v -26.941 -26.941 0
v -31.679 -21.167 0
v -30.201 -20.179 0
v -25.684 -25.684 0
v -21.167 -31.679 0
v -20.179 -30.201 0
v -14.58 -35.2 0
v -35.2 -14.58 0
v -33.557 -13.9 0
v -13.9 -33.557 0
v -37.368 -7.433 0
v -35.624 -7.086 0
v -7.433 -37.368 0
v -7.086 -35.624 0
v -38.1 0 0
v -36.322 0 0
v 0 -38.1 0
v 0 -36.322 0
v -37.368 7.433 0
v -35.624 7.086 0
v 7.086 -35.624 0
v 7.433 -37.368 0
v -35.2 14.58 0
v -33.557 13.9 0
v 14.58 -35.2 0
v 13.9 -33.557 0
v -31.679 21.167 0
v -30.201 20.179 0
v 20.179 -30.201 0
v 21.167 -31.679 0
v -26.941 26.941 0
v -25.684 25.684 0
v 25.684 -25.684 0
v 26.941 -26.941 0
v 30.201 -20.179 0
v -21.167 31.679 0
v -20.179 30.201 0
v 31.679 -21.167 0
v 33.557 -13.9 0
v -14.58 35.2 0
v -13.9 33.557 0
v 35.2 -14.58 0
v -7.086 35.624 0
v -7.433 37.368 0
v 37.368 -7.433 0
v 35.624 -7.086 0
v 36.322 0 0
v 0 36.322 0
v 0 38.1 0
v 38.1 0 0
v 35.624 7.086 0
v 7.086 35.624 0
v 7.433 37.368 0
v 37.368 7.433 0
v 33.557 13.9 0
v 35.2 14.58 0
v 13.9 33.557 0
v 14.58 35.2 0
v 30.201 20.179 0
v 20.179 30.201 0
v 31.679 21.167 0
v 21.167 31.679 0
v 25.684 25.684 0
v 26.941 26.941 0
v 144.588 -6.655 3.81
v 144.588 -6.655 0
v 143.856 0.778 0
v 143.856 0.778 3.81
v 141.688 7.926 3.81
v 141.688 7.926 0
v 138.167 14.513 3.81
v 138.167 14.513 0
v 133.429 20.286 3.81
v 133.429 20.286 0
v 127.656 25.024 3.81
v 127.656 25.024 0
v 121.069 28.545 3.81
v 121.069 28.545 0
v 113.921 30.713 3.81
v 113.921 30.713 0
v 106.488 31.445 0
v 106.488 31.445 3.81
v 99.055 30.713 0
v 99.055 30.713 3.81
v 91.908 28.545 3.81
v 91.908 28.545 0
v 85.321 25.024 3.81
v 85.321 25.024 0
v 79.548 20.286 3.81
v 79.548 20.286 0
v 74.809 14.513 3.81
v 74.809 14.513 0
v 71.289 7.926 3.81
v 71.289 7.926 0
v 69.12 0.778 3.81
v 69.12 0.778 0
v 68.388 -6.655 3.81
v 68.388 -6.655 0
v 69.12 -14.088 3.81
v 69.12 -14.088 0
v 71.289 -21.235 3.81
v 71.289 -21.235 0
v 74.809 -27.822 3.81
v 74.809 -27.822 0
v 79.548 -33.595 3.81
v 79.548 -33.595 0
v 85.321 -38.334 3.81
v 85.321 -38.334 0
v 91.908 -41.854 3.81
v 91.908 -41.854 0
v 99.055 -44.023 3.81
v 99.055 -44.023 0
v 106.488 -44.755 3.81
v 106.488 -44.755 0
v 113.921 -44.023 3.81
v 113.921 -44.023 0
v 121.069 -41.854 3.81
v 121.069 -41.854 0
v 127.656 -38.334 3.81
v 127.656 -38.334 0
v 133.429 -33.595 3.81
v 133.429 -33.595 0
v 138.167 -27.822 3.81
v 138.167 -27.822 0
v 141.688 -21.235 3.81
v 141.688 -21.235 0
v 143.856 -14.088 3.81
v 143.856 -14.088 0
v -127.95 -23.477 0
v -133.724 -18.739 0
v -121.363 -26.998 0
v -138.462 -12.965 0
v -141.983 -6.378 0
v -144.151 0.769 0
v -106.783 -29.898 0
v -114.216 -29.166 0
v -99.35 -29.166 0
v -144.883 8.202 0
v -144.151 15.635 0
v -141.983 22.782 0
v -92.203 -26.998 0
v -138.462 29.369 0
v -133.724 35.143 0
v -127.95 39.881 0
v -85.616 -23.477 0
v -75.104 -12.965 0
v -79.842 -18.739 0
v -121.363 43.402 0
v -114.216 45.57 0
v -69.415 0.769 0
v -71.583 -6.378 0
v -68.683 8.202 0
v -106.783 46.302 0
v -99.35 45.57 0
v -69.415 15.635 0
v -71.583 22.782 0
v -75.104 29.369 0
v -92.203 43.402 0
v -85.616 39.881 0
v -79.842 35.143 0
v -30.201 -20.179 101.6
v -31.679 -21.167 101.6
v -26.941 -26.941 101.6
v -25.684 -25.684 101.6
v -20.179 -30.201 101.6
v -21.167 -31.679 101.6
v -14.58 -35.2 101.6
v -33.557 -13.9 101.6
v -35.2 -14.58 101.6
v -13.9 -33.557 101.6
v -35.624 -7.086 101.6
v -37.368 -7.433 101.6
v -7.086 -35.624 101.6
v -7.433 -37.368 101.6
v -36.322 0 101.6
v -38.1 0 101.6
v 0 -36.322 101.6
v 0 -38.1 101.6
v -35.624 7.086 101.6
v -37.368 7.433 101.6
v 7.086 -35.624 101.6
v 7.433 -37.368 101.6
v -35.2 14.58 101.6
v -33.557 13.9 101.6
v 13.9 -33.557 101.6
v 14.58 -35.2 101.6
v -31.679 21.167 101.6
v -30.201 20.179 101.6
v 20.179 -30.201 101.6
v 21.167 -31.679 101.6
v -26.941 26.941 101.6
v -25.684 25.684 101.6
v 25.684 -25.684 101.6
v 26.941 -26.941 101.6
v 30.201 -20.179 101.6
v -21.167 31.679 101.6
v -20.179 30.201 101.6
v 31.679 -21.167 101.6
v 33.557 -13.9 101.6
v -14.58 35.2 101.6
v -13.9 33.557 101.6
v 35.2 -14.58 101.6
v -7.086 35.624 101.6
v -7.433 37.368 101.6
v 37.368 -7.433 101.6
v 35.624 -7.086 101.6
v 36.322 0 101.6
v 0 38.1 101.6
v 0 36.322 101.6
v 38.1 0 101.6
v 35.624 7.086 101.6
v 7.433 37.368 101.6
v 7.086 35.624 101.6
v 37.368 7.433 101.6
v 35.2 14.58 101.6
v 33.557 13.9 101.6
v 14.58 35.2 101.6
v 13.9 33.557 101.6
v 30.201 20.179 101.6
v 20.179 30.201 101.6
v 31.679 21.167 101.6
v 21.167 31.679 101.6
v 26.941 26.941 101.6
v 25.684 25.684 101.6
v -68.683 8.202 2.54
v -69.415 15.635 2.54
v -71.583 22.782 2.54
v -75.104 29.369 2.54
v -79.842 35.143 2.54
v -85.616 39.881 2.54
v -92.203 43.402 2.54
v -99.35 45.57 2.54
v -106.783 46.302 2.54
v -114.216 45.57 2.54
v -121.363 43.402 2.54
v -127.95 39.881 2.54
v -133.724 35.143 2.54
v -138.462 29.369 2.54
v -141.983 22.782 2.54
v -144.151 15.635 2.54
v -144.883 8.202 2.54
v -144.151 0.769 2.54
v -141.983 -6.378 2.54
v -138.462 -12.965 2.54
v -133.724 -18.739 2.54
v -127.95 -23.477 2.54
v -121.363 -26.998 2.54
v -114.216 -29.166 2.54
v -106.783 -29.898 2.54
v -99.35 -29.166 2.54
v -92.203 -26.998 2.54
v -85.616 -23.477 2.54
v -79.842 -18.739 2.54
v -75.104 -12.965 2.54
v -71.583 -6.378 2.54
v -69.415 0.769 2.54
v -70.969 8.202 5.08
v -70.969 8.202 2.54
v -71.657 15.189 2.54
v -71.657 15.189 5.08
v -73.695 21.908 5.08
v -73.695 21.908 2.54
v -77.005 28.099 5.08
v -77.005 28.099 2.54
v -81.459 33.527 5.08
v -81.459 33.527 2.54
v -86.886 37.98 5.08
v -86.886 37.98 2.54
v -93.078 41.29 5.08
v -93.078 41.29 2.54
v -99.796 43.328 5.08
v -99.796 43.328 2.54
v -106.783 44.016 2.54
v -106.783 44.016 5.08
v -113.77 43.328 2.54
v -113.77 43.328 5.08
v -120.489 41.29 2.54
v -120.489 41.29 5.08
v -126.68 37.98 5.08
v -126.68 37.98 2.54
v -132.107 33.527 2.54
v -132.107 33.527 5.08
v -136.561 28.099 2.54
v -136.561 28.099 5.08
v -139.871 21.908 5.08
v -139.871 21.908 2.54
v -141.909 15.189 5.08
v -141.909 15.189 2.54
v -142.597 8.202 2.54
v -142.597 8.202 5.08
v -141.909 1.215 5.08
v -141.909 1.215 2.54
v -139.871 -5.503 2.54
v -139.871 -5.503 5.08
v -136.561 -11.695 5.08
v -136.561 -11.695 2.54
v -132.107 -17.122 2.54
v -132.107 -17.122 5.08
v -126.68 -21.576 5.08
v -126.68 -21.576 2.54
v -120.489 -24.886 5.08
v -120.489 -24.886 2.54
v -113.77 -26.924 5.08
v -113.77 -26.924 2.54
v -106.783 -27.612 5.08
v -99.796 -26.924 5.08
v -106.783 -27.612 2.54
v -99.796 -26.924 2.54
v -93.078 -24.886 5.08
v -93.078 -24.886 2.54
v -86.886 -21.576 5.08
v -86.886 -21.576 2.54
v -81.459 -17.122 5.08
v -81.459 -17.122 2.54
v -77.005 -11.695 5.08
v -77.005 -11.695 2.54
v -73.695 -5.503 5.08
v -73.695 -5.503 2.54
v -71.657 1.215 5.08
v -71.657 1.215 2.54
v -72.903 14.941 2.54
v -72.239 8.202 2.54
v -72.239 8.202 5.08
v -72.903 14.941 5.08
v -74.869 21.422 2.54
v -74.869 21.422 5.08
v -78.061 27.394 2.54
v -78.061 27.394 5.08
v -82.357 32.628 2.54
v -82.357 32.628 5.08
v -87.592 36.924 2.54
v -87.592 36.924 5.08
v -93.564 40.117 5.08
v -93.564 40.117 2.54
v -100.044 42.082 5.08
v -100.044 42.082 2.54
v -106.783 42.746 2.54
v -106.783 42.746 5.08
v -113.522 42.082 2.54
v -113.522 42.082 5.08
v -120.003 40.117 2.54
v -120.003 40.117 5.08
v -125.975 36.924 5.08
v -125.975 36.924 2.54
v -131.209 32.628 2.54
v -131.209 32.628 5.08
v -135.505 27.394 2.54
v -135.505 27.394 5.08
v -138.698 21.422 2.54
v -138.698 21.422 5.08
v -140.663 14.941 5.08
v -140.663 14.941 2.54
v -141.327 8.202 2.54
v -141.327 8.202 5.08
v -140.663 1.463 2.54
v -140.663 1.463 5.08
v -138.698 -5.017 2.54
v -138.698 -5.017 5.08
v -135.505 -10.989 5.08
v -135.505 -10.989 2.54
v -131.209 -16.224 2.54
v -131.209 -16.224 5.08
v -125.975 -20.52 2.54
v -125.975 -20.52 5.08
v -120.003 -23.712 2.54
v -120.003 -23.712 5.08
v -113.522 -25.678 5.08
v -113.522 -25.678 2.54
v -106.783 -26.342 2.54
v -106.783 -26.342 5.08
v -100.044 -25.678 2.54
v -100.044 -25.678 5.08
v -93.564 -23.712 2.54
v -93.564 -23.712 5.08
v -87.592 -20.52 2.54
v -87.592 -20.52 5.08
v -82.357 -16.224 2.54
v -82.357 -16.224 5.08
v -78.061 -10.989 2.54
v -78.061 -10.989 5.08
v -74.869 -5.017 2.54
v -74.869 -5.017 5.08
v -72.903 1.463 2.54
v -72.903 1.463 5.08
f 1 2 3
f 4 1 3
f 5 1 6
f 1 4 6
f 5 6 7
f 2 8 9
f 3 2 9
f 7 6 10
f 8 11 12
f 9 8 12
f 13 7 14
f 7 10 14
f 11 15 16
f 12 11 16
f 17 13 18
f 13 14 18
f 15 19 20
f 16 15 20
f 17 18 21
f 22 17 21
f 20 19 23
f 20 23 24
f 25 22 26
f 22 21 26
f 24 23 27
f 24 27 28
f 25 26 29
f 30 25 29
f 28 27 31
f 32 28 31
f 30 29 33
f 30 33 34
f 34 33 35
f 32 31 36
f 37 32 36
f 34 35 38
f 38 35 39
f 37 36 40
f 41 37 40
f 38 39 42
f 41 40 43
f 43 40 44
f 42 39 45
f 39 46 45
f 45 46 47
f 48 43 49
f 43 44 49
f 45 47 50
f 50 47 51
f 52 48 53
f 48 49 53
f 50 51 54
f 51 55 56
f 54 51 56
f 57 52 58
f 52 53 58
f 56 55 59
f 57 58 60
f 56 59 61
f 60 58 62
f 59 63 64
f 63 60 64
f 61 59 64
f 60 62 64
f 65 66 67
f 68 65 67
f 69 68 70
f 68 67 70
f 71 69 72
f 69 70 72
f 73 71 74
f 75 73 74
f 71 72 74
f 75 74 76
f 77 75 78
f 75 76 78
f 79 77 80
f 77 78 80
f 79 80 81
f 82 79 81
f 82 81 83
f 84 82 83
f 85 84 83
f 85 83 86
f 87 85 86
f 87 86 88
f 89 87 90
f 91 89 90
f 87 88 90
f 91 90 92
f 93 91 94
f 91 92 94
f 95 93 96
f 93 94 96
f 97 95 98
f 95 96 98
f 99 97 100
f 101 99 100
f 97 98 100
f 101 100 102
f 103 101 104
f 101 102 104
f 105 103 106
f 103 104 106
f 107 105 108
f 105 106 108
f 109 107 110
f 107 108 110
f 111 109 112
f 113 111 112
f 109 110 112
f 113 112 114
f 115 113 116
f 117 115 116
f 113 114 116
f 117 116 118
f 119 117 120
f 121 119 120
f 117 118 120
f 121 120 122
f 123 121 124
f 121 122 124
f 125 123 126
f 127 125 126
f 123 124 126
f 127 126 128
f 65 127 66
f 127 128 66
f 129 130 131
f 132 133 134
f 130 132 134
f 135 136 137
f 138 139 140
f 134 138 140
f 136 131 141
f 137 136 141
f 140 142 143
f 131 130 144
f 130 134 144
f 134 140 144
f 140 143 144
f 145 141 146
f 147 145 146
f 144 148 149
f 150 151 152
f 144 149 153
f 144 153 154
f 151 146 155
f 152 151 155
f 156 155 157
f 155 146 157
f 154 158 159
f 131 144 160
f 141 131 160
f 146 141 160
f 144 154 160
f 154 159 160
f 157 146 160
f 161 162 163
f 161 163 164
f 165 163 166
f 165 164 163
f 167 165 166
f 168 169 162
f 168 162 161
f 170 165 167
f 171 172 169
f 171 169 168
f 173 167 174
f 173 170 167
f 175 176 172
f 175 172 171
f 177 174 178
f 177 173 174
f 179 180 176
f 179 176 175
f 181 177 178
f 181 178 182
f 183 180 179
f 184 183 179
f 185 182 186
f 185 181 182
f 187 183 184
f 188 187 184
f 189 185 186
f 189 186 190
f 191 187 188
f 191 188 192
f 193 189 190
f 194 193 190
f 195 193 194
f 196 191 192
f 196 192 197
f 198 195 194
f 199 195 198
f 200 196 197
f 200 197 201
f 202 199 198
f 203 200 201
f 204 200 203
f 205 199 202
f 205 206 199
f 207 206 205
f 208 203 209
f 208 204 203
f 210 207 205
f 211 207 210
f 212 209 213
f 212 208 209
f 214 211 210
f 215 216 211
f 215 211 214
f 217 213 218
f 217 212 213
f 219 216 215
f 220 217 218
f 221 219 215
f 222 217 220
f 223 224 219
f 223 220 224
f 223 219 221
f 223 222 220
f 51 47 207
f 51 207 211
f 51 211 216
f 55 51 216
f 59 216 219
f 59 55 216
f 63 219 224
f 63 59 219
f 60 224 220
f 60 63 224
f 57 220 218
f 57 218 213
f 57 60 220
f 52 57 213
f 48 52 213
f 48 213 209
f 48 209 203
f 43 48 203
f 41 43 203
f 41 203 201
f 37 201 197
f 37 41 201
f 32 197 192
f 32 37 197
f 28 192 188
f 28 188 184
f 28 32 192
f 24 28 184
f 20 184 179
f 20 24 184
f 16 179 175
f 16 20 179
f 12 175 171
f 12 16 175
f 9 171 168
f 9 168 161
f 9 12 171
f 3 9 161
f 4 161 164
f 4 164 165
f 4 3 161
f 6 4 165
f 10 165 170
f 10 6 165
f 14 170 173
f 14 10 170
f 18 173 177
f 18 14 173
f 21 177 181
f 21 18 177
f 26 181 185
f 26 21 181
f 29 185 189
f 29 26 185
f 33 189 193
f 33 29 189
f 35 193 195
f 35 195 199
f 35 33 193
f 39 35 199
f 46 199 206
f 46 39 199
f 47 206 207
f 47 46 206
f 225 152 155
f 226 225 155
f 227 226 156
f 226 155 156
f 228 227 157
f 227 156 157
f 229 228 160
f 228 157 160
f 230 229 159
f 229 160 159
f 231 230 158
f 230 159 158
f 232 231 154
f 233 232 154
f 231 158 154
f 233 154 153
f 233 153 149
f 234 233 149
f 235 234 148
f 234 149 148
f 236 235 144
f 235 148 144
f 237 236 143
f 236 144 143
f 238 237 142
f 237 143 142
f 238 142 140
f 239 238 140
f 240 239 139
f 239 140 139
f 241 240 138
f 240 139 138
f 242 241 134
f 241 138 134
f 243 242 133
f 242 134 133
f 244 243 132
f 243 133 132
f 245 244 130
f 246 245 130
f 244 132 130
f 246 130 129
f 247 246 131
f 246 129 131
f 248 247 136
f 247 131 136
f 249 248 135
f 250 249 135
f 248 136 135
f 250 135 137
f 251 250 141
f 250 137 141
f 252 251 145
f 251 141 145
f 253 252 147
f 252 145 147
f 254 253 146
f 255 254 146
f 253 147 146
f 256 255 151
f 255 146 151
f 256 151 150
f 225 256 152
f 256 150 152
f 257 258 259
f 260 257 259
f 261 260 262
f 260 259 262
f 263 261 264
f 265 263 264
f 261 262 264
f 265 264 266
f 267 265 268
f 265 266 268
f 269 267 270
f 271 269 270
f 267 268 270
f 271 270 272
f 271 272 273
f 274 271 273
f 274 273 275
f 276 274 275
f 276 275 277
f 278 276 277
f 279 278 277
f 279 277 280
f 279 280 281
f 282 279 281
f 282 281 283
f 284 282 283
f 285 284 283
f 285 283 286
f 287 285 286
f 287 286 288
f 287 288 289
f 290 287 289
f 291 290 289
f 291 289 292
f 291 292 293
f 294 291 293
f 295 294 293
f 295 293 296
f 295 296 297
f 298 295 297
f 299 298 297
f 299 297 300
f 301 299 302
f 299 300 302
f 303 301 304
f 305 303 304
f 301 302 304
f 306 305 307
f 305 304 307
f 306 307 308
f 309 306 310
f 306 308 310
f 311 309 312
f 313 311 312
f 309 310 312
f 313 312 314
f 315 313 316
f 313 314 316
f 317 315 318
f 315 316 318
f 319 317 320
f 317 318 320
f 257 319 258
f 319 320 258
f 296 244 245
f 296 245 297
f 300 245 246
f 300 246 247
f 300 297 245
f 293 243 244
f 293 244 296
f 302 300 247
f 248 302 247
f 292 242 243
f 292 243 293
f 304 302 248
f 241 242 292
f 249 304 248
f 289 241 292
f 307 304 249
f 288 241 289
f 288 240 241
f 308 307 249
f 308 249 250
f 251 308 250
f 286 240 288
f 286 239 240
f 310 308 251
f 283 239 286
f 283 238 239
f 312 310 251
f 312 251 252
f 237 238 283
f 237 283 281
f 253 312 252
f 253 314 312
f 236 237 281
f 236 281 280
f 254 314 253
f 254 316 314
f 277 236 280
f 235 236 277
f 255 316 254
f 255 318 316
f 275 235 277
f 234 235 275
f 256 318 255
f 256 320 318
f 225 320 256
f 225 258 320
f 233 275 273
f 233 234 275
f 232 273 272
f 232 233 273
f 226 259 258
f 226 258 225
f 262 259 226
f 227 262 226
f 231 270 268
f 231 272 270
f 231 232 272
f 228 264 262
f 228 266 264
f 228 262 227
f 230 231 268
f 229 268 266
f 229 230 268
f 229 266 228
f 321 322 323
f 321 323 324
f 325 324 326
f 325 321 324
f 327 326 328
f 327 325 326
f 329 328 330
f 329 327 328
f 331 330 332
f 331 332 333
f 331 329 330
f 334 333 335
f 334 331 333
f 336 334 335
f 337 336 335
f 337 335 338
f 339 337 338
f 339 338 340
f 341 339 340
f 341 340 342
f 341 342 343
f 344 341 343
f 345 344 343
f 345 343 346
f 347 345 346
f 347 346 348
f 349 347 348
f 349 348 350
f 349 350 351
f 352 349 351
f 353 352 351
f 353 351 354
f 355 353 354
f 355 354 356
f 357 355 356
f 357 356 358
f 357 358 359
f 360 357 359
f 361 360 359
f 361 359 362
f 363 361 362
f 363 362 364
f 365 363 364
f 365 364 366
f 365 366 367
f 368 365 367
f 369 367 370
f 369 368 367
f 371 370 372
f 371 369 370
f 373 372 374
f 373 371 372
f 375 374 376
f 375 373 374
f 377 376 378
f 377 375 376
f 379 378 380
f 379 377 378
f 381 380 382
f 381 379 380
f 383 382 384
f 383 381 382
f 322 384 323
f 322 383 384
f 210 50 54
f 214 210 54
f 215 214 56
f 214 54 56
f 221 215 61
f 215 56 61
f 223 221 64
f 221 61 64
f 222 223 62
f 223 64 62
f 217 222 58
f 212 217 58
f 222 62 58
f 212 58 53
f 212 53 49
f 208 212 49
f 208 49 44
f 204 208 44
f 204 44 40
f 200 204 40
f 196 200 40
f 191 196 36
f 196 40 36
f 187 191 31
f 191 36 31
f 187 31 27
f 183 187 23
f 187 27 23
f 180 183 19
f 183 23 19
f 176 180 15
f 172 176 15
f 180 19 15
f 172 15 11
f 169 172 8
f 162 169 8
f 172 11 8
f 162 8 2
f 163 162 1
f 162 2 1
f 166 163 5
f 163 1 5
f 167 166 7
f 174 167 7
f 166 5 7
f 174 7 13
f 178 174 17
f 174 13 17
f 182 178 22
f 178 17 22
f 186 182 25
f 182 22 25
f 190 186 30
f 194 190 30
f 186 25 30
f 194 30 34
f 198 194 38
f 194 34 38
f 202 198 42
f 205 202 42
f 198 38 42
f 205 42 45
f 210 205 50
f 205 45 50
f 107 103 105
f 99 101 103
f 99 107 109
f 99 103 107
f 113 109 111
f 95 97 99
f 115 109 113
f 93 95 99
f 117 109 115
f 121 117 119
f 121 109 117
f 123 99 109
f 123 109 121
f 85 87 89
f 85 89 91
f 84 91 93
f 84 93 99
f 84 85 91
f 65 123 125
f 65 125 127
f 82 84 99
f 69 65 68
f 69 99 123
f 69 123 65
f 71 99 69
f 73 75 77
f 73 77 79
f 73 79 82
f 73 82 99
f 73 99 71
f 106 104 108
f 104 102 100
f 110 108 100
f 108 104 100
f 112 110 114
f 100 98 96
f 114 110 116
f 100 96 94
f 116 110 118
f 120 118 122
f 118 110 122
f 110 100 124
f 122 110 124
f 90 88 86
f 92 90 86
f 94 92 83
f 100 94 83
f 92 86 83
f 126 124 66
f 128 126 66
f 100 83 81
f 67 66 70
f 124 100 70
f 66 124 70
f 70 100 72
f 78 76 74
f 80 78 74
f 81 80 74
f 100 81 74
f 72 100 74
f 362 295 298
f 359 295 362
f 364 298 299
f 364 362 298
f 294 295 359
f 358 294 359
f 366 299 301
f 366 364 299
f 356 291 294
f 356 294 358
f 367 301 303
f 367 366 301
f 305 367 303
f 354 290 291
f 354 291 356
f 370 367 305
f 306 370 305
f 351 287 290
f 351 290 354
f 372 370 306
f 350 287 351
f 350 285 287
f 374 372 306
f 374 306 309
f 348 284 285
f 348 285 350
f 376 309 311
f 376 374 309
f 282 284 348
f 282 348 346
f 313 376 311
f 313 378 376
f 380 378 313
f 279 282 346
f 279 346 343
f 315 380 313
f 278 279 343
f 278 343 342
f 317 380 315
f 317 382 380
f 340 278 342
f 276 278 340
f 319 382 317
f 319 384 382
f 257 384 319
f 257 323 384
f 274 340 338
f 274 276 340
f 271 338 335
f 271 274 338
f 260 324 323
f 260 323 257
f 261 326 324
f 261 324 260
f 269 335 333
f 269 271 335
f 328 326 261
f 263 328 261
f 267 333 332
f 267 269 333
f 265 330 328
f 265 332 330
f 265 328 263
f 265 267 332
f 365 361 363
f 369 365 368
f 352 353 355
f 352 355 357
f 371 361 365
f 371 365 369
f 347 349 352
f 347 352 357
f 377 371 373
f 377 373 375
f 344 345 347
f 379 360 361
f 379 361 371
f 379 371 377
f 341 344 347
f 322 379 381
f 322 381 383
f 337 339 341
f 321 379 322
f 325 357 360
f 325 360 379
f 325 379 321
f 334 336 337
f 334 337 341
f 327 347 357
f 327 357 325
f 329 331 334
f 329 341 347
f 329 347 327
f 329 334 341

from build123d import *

# Parameters (mm, degrees)
F0_R     = 38.1
F0_R_2   = 36.322
F1_DEPTH = 101.6
F2_R     = 38.1
F2_R_2   = 35.814
F3_DEPTH = 2.54
F2_R_3   = 34.544
F4_DEPTH = 5.08
F5_DEPTH = 2.54
F6_R     = 38.1
F7_DEPTH = 3.81


with BuildPart() as f1:
    # F0 (on Top) → F1 (new body)
    with BuildSketch(Plane.XY):
        Circle(F0_R)
        Circle(F0_R_2, mode=Mode.SUBTRACT)
    extrude(amount=F1_DEPTH)


with BuildPart() as f3:
    # F2 (on Top) → F3 (new body)
    with BuildSketch(Plane.XY):
        with Locations((-106.783174, 8.202186)):
            Circle(F2_R)
        with Locations((-106.783174, 8.202186)):
            Circle(F2_R_2, mode=Mode.SUBTRACT)
    extrude(amount=F3_DEPTH)

    # F2 (on Top) → F4 (join)
    with BuildSketch(Plane.XY):
        with Locations((-106.783174, 8.202186)):
            Circle(F2_R_2)
        with Locations((-106.783174, 8.202186)):
            Circle(F2_R_3, mode=Mode.SUBTRACT)
    extrude(amount=F4_DEPTH)

    # F2 (on Top) → F5 (join)
    with BuildSketch(Plane.XY):
        with Locations((-106.783174, 8.202186)):
            Circle(F2_R_3)
    extrude(amount=F5_DEPTH)


with BuildPart() as f7:
    # F6 (on Top) → F7 (new body)
    with BuildSketch(Plane.XY):
        with Locations((106.488392, -6.654604)):
            Circle(F6_R)
    extrude(amount=F7_DEPTH)


solid = Compound([f1.part, f3.part, f7.part])
